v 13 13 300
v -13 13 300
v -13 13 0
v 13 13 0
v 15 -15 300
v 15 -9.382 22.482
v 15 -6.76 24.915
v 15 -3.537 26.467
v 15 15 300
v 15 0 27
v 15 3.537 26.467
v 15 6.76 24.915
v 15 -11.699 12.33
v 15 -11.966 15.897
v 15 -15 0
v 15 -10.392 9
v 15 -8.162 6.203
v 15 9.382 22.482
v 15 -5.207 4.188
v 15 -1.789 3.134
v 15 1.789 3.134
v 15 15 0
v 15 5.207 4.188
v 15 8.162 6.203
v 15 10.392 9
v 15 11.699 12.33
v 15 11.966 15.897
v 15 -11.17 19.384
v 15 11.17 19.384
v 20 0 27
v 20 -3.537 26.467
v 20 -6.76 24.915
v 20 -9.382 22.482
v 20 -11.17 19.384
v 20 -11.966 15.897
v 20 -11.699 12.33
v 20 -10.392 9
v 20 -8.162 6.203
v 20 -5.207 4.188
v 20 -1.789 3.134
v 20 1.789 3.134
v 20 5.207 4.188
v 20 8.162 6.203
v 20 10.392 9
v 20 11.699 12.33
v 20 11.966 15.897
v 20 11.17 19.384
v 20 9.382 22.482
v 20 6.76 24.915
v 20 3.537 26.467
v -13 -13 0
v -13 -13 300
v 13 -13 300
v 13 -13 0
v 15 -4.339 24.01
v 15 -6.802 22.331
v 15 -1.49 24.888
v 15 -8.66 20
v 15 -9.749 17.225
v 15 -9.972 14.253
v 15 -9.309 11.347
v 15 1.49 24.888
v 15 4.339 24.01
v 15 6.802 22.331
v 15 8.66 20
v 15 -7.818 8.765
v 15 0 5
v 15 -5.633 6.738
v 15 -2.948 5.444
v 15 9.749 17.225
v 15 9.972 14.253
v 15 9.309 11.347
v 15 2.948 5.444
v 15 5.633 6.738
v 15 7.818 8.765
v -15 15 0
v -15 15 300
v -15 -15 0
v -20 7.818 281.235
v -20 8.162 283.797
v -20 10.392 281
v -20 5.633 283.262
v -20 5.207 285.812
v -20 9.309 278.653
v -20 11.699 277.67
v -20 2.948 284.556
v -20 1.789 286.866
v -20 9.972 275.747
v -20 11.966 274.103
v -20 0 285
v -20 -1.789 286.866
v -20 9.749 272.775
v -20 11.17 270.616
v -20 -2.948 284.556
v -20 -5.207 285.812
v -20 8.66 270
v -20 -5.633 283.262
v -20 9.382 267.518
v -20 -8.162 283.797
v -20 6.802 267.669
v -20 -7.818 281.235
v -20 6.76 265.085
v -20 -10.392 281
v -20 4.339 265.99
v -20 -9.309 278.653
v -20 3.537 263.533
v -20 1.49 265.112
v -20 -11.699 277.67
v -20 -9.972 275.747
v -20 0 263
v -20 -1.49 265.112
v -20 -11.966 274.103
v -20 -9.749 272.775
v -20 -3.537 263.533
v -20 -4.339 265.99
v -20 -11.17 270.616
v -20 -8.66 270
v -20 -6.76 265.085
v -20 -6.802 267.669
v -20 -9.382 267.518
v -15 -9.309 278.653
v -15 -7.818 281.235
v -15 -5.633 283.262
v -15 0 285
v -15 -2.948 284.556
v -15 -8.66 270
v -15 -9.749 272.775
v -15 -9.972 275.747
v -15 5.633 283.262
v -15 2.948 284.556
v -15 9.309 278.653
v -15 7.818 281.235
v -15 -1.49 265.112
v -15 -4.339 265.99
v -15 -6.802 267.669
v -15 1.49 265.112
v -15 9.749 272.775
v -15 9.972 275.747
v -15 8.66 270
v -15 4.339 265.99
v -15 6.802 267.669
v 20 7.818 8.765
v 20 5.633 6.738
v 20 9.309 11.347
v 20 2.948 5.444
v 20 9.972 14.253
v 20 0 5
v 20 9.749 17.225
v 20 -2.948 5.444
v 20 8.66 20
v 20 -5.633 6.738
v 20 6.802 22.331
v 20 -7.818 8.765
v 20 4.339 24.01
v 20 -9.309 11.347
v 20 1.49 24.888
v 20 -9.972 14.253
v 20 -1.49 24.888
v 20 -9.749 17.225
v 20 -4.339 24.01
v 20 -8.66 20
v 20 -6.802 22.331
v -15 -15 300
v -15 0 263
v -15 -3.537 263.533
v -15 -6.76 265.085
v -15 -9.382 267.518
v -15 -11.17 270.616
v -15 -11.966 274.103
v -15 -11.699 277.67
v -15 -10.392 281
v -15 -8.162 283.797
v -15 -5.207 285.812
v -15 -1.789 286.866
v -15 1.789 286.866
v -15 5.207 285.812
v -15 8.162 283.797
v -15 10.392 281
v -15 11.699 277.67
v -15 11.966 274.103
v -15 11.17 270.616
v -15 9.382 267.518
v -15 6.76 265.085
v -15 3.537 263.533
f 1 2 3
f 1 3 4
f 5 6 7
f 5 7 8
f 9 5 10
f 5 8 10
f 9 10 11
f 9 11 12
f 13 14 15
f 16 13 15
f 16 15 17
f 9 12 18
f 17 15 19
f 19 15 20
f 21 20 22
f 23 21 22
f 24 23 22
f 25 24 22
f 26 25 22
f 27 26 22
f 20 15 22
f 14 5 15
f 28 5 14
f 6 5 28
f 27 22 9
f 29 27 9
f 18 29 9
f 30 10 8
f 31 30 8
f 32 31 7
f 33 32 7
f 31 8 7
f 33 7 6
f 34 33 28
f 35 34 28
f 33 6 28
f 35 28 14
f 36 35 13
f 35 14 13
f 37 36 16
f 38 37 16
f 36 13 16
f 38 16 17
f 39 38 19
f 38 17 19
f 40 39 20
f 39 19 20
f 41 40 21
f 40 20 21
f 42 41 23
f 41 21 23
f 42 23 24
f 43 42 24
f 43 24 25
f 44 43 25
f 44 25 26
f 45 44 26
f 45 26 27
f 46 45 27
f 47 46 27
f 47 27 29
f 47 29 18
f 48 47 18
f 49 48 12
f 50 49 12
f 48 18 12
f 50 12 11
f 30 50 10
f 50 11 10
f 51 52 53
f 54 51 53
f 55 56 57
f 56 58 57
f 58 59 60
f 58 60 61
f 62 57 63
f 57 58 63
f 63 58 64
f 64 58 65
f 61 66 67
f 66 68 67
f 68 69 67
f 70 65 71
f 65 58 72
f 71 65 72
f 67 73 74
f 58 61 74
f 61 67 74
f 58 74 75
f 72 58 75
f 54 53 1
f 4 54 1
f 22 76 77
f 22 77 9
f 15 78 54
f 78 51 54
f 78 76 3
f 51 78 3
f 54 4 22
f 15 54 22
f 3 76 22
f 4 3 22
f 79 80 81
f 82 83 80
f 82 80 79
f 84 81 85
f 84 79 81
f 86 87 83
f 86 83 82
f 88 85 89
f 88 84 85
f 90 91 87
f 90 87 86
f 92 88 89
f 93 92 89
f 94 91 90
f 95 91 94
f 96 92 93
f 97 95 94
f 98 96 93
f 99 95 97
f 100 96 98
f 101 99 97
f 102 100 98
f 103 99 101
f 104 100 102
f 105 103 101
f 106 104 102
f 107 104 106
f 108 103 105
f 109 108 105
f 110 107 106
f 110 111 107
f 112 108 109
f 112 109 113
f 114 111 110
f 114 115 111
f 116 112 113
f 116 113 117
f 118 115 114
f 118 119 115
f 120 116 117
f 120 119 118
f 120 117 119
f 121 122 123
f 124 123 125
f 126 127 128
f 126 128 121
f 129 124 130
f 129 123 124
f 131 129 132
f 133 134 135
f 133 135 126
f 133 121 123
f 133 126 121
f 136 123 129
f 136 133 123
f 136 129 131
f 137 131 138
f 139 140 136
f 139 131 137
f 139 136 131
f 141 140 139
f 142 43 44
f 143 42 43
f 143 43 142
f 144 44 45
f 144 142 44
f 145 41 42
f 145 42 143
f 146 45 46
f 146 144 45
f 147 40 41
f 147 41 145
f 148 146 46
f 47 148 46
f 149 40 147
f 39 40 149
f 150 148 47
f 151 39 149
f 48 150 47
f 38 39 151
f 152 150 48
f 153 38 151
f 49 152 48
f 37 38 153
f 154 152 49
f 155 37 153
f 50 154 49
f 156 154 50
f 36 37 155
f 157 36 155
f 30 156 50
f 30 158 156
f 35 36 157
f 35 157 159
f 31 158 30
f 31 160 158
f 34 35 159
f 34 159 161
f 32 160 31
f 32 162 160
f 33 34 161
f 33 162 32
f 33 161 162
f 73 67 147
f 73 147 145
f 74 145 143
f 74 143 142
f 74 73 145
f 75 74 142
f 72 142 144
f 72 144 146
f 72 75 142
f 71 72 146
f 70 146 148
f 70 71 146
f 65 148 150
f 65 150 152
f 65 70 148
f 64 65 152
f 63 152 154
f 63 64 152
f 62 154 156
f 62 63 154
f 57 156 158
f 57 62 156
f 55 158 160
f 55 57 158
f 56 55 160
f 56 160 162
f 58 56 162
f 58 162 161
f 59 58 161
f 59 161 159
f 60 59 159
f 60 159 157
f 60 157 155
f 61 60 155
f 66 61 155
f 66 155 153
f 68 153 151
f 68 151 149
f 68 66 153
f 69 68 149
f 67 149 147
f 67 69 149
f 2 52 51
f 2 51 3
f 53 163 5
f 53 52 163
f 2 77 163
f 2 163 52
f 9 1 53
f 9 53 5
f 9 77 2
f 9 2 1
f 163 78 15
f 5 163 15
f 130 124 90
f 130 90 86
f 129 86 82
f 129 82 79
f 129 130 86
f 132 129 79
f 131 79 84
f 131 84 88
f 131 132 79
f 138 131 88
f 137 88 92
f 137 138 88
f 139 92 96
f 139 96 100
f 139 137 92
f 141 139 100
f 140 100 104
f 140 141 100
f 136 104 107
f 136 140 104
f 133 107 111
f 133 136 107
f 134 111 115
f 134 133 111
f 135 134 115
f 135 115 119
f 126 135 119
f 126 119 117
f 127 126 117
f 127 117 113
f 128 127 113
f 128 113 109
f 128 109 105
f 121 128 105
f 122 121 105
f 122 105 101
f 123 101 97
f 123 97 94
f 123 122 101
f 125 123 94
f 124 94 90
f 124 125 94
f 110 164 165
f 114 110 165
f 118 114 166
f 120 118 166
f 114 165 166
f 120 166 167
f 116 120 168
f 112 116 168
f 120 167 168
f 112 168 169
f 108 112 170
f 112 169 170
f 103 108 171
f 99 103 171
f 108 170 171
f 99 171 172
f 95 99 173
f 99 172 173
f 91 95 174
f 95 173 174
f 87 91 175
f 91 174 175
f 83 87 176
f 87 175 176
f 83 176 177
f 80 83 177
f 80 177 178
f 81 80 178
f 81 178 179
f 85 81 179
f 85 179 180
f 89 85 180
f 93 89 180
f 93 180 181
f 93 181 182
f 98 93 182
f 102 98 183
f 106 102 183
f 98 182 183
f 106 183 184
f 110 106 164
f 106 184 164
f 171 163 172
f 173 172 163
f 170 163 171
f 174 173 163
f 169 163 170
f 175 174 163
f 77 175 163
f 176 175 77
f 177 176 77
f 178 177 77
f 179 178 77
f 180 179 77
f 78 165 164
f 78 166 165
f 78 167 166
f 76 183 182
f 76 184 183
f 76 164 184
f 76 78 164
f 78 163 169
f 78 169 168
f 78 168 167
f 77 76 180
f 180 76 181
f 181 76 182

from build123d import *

# Parameters (mm, degrees)
SKETCH1_W           = 30
SKETCH1_H           = 30
SKETCH1_W_2         = 26
SKETCH1_H_2         = 26
BOSS_EXTRUDE1_DEPTH = 300
SKETCH2_R           = 12
SKETCH2_R_2         = 10
BOSS_EXTRUDE2_DEPTH = 5
SKETCH3_R           = 12
SKETCH3_R_2         = 10
BOSS_EXTRUDE3_DEPTH = 5


with BuildPart() as part:
    # Sketch1 → Boss-Extrude1 (new body)
    with BuildSketch(Plane.XY):
        Rectangle(SKETCH1_W, SKETCH1_H)
        Rectangle(SKETCH1_W_2, SKETCH1_H_2, mode=Mode.SUBTRACT)
    extrude(amount=BOSS_EXTRUDE1_DEPTH)

    # Sketch2 → Boss-Extrude2 (add)
    with BuildSketch(Plane(origin=(15, 0, 0), x_dir=(0, 0, -1), z_dir=(1, 0, 0))):
        with Locations(Location((-15, 0, 0), (0, 0, 180))):
            Circle(SKETCH2_R)
        with Locations((-15, 0)):
            Circle(SKETCH2_R_2, mode=Mode.SUBTRACT)
    extrude(amount=BOSS_EXTRUDE2_DEPTH)

    # Sketch3 → Boss-Extrude3 (add)
    with BuildSketch(Plane.ZY.offset(15)):
        with Locations(Location((275, 0, 0), (0, 0, 180))):
            Circle(SKETCH3_R)
        with Locations((275, 0)):
            Circle(SKETCH3_R_2, mode=Mode.SUBTRACT)
    extrude(amount=BOSS_EXTRUDE3_DEPTH)


solid = part.part
